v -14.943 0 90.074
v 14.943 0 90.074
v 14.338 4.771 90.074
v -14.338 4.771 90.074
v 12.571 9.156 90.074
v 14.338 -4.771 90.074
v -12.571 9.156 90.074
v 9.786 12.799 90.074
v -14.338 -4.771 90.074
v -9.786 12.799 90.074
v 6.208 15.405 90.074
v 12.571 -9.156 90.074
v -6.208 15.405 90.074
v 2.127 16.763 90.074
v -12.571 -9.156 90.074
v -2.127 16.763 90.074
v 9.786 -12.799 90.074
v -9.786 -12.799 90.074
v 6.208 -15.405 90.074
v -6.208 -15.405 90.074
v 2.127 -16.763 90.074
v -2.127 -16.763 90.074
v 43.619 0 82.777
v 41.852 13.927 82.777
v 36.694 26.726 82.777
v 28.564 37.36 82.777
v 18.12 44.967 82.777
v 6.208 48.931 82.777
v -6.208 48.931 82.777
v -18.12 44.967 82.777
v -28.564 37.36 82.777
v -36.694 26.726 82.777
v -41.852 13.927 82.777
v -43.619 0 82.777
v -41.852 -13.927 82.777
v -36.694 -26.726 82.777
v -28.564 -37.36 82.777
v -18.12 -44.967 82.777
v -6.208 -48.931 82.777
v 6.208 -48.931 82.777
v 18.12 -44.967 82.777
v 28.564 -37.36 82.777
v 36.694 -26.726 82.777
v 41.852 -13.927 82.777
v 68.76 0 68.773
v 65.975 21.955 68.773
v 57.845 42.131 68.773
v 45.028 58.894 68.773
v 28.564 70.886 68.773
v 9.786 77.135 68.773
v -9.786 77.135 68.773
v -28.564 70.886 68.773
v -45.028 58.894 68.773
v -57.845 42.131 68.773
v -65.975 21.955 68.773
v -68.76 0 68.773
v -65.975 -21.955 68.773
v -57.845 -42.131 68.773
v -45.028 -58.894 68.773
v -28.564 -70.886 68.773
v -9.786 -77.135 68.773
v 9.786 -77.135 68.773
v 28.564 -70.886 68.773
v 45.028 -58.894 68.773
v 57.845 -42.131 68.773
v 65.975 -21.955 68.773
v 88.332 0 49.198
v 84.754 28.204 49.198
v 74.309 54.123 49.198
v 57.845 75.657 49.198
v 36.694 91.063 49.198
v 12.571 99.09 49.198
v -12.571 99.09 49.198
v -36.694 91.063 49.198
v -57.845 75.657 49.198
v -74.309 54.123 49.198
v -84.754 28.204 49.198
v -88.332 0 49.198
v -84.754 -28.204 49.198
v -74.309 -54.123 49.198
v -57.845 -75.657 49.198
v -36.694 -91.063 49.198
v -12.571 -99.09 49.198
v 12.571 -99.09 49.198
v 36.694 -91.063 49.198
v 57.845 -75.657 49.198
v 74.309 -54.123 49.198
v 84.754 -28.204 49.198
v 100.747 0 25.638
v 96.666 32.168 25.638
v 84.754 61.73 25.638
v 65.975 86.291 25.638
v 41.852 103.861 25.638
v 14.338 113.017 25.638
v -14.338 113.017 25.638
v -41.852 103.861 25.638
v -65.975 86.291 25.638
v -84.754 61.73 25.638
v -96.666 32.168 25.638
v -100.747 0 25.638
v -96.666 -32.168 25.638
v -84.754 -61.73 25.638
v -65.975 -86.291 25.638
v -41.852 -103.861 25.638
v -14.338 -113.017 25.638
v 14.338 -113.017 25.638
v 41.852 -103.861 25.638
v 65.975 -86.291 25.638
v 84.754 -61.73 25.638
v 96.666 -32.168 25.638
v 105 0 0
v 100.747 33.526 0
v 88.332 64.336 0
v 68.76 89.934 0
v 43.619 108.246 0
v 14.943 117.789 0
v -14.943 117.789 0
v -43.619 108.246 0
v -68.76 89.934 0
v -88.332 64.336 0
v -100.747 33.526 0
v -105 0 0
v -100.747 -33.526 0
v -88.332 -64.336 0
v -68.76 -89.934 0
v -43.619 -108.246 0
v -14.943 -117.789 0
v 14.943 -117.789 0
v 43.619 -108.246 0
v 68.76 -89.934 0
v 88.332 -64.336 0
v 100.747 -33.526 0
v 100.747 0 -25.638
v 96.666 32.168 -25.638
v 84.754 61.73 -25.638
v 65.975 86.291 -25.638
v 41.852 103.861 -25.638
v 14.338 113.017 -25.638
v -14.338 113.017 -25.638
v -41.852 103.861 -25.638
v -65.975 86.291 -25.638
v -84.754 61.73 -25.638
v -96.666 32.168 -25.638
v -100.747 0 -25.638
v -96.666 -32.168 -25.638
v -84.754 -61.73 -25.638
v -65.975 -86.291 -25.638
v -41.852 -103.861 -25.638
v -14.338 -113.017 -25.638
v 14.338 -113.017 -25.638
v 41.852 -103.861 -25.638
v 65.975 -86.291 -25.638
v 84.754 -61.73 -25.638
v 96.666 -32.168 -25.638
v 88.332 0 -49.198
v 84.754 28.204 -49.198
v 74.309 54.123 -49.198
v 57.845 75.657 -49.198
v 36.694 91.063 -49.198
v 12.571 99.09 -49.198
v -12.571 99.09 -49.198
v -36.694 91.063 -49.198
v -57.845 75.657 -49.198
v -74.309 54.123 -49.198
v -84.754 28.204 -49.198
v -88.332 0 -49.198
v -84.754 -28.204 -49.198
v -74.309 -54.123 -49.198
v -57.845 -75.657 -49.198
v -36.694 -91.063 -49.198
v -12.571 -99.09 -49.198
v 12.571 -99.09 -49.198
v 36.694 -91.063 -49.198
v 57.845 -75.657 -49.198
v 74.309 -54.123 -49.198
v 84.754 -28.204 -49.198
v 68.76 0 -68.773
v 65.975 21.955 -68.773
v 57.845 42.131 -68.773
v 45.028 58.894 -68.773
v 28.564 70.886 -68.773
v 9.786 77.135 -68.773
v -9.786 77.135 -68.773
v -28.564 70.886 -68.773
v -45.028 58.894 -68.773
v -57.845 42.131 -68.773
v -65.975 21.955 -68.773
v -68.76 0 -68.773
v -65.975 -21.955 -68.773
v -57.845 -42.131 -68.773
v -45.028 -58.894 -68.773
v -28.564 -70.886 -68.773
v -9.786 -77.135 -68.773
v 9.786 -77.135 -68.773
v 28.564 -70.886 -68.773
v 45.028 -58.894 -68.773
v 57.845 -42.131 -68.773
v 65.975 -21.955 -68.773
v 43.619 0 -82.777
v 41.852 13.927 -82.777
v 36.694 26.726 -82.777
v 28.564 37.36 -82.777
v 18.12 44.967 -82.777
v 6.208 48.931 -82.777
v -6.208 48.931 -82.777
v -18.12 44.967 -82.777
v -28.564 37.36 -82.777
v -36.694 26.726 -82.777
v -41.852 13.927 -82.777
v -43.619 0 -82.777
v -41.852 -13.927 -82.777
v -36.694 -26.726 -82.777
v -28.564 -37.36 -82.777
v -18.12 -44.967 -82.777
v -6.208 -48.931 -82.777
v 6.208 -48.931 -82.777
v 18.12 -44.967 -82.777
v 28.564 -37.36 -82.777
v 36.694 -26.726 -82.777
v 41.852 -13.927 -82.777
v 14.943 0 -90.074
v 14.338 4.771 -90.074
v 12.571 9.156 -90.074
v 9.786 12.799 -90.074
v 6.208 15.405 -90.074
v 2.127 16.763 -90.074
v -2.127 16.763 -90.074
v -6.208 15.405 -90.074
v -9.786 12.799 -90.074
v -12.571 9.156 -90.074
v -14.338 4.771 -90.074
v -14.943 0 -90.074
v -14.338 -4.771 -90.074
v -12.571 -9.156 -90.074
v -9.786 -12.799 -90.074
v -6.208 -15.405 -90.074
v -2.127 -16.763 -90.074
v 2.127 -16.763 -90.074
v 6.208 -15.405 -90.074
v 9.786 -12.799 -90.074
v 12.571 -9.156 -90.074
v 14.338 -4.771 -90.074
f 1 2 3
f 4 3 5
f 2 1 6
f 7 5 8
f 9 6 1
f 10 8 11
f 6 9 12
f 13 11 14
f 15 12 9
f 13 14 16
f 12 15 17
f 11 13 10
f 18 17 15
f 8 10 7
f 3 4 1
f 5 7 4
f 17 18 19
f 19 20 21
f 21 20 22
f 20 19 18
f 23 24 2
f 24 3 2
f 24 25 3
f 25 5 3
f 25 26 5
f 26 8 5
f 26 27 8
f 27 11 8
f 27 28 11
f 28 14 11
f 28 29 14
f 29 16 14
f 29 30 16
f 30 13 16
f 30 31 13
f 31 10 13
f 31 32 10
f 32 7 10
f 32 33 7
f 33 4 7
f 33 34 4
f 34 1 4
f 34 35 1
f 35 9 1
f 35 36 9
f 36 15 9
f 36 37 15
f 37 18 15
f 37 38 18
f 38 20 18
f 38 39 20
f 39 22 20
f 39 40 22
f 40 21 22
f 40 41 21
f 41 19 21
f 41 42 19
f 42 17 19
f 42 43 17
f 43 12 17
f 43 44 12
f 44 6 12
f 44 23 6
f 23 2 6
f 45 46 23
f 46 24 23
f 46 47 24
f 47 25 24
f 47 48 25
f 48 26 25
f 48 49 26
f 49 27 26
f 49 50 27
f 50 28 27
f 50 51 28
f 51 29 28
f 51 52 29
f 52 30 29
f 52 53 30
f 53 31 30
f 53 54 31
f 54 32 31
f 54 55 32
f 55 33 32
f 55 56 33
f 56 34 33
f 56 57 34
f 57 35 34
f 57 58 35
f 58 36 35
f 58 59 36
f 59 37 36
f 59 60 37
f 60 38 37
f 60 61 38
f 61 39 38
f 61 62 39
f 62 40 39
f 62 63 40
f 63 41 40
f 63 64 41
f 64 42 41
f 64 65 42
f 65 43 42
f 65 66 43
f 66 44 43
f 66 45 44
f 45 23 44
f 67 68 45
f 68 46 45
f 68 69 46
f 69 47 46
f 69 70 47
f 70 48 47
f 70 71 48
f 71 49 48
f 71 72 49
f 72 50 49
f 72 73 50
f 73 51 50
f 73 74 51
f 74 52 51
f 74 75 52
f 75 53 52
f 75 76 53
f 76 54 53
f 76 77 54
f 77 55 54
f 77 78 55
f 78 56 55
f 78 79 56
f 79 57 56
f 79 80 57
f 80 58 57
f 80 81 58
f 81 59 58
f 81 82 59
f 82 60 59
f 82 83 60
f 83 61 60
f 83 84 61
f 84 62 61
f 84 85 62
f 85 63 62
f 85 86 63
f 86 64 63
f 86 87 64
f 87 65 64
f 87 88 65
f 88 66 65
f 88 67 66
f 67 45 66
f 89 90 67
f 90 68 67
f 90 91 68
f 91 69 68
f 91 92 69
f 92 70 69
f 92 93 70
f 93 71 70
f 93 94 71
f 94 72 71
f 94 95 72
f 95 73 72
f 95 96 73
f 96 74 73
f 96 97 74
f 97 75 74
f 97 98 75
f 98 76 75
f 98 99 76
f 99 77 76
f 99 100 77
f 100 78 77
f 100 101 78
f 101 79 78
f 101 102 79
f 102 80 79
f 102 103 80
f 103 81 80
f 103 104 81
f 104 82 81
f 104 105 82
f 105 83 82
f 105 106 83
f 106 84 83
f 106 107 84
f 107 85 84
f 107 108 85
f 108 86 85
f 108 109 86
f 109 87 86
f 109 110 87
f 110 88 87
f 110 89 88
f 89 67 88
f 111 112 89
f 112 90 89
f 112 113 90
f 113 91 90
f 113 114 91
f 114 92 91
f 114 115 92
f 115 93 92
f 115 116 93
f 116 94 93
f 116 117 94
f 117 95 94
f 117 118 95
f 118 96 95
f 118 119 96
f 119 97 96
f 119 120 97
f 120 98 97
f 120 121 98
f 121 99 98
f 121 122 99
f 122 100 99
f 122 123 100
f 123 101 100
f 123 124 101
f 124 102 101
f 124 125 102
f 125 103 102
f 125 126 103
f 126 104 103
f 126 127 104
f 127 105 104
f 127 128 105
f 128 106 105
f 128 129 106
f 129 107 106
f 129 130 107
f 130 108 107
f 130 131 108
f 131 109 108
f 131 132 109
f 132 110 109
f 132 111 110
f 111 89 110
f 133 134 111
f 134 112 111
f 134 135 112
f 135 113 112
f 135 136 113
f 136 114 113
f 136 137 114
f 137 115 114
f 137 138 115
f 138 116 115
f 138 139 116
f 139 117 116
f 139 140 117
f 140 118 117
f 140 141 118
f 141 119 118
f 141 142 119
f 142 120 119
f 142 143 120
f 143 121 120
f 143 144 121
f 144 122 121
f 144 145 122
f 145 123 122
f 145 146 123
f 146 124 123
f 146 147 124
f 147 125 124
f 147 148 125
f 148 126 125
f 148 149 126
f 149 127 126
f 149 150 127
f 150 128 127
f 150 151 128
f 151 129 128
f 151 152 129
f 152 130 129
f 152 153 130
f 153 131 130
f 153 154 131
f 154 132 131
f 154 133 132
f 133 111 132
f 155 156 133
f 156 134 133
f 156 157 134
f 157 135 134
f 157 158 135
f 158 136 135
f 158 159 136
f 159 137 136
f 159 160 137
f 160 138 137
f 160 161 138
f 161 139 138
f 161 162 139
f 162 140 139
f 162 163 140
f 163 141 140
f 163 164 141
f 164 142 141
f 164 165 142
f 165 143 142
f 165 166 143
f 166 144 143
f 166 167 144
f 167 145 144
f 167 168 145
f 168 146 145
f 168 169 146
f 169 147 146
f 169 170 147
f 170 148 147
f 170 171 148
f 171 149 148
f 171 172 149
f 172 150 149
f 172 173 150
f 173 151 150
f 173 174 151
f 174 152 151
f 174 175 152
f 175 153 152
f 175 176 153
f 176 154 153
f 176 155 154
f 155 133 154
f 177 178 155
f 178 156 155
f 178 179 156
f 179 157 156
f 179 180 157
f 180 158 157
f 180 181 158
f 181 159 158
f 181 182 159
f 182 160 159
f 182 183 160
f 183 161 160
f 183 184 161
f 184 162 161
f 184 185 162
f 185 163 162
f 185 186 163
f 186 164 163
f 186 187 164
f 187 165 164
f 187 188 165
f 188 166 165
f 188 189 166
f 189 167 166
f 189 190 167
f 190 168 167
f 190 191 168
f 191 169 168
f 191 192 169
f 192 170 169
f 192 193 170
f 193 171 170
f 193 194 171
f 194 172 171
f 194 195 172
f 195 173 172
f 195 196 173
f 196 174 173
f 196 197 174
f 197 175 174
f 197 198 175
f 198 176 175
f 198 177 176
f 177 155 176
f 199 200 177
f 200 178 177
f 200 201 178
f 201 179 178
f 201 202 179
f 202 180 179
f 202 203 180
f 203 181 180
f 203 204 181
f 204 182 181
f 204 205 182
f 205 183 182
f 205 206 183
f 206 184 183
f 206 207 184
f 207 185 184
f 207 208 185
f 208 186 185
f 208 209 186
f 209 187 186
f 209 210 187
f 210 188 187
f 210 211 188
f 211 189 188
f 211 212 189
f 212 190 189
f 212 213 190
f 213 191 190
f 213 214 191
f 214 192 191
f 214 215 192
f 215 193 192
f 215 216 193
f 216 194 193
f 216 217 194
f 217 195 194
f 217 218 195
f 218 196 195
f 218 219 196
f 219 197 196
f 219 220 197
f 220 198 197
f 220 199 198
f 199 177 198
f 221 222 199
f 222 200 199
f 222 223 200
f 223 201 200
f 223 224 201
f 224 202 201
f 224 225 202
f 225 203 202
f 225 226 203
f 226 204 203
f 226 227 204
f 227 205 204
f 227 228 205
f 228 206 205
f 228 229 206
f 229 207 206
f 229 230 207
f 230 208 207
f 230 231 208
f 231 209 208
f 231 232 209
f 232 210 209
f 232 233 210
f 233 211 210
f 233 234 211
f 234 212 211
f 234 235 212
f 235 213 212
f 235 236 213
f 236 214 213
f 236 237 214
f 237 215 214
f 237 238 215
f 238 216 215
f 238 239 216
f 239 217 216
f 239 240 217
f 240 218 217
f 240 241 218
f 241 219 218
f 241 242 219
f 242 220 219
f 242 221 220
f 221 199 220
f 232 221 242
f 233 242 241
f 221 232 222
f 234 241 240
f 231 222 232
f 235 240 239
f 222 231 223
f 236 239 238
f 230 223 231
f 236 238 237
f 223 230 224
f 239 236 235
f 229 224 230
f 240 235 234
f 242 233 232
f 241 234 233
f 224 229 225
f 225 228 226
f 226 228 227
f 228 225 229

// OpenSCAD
// Generated by SolidPython 1.0.1 on 2020-07-29 00:46:52


scale(v = [15, 17, 13]) {
	sphere(r = 7);
}
/***********************************************
*********      SolidPython code:      **********
************************************************
 
# import packages: SolidPython
from solid import *
from solid.utils import *
from itertools import chain, combinations, permutations


class Resize:

    def __init__(self, scad_file):
        self.scad_file = scad_file
        #self.scad_file = import_scad(scad_file)
        # cone/cylinder param:
        self.r1 = 0
        self.r2 = 0
        self.h = 0
        # rectangular prism param:
        self.w = 0
        self.l = 0
        # ellipse param:
        self.r = 0

    # import OpenScad code (file name corresponds to shape)


    # classify shape + parameters
    def assign(self, param1, param2, param3):
        if self.scad_file == 'cone.scad':
            self.r1 = param1
            self.r2 = param2
            self.h = param3
        elif self.scad_file == 'cylinder.scad':
            self.r1 = param1
            self.r2 = param2
            self.h = param3
        elif self.scad_file == 'rectangularPrism.scad':
            self.h = param1
            self.l = param2
            self.w = param3
        else:
            self.r = param1
            self.h = param2

    # resize parameters
    def iterate(self):
        x = range(3, 20, 2)
        i = 1
        if self.scad_file == 'cone.scad':
            tempList = list(permutations(x, 2))
            for temp in tempList:
                param1 = temp[0]
                param2 = temp[1]
                filepath = 'produced_scad_files/' + 'cone' + str(param1) + '_' + str(param2) + '_' + '.scad'
                scad_render_to_file(cylinder(h=param1, r1=param2, r2=0), filepath)

        elif self.scad_file == 'cylinder.scad':
            tempList = list(permutations(x, 3))
            for temp in tempList:
                param1 = temp[0]
                param2 = temp[1]
                filepath = 'produced_scad_files/' + 'cylinder' + str(param1) + '_' + str(param2) + '_' + '.scad'
                scad_render_to_file(cylinder(h=param1, r1=param2, r2=param2), filepath)

        elif self.scad_file == 'rectangularPrism.scad':
            tempList = list(permutations(x, 3))
            for temp in tempList:
                param1 = temp[0]
                param2 = temp[1]
                param3 = temp[2]
                filepath = 'produced_scad_files/' + 'rectangularPrism' + str(param1) + '_' + str(param2) + '_' + str(
                    param3) + '.scad'
                scad_render_to_file(cube(size=(param1, param2, param3)), filepath)

        elif self.scad_file == 'ellipse.scad':
            tempList = list(permutations(x, 4))
            for temp in tempList:
                param1 = temp[0]
                param2 = temp[1]
                param3 = temp[2]
                param4 = temp[3]
                filepath = 'produced_scad_files/' + 'ellipse' + str(param1) + '_' + str(param2) + '_' + str(param3) + '_' + str(param4) + '.scad'
                scad_render_to_file(scale([param1, param2, param3])(sphere(r=param4)), filepath)

    def render_to_scadfile(self):
        scad_render_to_file(scad, 'example.scad') 
 
************************************************/
